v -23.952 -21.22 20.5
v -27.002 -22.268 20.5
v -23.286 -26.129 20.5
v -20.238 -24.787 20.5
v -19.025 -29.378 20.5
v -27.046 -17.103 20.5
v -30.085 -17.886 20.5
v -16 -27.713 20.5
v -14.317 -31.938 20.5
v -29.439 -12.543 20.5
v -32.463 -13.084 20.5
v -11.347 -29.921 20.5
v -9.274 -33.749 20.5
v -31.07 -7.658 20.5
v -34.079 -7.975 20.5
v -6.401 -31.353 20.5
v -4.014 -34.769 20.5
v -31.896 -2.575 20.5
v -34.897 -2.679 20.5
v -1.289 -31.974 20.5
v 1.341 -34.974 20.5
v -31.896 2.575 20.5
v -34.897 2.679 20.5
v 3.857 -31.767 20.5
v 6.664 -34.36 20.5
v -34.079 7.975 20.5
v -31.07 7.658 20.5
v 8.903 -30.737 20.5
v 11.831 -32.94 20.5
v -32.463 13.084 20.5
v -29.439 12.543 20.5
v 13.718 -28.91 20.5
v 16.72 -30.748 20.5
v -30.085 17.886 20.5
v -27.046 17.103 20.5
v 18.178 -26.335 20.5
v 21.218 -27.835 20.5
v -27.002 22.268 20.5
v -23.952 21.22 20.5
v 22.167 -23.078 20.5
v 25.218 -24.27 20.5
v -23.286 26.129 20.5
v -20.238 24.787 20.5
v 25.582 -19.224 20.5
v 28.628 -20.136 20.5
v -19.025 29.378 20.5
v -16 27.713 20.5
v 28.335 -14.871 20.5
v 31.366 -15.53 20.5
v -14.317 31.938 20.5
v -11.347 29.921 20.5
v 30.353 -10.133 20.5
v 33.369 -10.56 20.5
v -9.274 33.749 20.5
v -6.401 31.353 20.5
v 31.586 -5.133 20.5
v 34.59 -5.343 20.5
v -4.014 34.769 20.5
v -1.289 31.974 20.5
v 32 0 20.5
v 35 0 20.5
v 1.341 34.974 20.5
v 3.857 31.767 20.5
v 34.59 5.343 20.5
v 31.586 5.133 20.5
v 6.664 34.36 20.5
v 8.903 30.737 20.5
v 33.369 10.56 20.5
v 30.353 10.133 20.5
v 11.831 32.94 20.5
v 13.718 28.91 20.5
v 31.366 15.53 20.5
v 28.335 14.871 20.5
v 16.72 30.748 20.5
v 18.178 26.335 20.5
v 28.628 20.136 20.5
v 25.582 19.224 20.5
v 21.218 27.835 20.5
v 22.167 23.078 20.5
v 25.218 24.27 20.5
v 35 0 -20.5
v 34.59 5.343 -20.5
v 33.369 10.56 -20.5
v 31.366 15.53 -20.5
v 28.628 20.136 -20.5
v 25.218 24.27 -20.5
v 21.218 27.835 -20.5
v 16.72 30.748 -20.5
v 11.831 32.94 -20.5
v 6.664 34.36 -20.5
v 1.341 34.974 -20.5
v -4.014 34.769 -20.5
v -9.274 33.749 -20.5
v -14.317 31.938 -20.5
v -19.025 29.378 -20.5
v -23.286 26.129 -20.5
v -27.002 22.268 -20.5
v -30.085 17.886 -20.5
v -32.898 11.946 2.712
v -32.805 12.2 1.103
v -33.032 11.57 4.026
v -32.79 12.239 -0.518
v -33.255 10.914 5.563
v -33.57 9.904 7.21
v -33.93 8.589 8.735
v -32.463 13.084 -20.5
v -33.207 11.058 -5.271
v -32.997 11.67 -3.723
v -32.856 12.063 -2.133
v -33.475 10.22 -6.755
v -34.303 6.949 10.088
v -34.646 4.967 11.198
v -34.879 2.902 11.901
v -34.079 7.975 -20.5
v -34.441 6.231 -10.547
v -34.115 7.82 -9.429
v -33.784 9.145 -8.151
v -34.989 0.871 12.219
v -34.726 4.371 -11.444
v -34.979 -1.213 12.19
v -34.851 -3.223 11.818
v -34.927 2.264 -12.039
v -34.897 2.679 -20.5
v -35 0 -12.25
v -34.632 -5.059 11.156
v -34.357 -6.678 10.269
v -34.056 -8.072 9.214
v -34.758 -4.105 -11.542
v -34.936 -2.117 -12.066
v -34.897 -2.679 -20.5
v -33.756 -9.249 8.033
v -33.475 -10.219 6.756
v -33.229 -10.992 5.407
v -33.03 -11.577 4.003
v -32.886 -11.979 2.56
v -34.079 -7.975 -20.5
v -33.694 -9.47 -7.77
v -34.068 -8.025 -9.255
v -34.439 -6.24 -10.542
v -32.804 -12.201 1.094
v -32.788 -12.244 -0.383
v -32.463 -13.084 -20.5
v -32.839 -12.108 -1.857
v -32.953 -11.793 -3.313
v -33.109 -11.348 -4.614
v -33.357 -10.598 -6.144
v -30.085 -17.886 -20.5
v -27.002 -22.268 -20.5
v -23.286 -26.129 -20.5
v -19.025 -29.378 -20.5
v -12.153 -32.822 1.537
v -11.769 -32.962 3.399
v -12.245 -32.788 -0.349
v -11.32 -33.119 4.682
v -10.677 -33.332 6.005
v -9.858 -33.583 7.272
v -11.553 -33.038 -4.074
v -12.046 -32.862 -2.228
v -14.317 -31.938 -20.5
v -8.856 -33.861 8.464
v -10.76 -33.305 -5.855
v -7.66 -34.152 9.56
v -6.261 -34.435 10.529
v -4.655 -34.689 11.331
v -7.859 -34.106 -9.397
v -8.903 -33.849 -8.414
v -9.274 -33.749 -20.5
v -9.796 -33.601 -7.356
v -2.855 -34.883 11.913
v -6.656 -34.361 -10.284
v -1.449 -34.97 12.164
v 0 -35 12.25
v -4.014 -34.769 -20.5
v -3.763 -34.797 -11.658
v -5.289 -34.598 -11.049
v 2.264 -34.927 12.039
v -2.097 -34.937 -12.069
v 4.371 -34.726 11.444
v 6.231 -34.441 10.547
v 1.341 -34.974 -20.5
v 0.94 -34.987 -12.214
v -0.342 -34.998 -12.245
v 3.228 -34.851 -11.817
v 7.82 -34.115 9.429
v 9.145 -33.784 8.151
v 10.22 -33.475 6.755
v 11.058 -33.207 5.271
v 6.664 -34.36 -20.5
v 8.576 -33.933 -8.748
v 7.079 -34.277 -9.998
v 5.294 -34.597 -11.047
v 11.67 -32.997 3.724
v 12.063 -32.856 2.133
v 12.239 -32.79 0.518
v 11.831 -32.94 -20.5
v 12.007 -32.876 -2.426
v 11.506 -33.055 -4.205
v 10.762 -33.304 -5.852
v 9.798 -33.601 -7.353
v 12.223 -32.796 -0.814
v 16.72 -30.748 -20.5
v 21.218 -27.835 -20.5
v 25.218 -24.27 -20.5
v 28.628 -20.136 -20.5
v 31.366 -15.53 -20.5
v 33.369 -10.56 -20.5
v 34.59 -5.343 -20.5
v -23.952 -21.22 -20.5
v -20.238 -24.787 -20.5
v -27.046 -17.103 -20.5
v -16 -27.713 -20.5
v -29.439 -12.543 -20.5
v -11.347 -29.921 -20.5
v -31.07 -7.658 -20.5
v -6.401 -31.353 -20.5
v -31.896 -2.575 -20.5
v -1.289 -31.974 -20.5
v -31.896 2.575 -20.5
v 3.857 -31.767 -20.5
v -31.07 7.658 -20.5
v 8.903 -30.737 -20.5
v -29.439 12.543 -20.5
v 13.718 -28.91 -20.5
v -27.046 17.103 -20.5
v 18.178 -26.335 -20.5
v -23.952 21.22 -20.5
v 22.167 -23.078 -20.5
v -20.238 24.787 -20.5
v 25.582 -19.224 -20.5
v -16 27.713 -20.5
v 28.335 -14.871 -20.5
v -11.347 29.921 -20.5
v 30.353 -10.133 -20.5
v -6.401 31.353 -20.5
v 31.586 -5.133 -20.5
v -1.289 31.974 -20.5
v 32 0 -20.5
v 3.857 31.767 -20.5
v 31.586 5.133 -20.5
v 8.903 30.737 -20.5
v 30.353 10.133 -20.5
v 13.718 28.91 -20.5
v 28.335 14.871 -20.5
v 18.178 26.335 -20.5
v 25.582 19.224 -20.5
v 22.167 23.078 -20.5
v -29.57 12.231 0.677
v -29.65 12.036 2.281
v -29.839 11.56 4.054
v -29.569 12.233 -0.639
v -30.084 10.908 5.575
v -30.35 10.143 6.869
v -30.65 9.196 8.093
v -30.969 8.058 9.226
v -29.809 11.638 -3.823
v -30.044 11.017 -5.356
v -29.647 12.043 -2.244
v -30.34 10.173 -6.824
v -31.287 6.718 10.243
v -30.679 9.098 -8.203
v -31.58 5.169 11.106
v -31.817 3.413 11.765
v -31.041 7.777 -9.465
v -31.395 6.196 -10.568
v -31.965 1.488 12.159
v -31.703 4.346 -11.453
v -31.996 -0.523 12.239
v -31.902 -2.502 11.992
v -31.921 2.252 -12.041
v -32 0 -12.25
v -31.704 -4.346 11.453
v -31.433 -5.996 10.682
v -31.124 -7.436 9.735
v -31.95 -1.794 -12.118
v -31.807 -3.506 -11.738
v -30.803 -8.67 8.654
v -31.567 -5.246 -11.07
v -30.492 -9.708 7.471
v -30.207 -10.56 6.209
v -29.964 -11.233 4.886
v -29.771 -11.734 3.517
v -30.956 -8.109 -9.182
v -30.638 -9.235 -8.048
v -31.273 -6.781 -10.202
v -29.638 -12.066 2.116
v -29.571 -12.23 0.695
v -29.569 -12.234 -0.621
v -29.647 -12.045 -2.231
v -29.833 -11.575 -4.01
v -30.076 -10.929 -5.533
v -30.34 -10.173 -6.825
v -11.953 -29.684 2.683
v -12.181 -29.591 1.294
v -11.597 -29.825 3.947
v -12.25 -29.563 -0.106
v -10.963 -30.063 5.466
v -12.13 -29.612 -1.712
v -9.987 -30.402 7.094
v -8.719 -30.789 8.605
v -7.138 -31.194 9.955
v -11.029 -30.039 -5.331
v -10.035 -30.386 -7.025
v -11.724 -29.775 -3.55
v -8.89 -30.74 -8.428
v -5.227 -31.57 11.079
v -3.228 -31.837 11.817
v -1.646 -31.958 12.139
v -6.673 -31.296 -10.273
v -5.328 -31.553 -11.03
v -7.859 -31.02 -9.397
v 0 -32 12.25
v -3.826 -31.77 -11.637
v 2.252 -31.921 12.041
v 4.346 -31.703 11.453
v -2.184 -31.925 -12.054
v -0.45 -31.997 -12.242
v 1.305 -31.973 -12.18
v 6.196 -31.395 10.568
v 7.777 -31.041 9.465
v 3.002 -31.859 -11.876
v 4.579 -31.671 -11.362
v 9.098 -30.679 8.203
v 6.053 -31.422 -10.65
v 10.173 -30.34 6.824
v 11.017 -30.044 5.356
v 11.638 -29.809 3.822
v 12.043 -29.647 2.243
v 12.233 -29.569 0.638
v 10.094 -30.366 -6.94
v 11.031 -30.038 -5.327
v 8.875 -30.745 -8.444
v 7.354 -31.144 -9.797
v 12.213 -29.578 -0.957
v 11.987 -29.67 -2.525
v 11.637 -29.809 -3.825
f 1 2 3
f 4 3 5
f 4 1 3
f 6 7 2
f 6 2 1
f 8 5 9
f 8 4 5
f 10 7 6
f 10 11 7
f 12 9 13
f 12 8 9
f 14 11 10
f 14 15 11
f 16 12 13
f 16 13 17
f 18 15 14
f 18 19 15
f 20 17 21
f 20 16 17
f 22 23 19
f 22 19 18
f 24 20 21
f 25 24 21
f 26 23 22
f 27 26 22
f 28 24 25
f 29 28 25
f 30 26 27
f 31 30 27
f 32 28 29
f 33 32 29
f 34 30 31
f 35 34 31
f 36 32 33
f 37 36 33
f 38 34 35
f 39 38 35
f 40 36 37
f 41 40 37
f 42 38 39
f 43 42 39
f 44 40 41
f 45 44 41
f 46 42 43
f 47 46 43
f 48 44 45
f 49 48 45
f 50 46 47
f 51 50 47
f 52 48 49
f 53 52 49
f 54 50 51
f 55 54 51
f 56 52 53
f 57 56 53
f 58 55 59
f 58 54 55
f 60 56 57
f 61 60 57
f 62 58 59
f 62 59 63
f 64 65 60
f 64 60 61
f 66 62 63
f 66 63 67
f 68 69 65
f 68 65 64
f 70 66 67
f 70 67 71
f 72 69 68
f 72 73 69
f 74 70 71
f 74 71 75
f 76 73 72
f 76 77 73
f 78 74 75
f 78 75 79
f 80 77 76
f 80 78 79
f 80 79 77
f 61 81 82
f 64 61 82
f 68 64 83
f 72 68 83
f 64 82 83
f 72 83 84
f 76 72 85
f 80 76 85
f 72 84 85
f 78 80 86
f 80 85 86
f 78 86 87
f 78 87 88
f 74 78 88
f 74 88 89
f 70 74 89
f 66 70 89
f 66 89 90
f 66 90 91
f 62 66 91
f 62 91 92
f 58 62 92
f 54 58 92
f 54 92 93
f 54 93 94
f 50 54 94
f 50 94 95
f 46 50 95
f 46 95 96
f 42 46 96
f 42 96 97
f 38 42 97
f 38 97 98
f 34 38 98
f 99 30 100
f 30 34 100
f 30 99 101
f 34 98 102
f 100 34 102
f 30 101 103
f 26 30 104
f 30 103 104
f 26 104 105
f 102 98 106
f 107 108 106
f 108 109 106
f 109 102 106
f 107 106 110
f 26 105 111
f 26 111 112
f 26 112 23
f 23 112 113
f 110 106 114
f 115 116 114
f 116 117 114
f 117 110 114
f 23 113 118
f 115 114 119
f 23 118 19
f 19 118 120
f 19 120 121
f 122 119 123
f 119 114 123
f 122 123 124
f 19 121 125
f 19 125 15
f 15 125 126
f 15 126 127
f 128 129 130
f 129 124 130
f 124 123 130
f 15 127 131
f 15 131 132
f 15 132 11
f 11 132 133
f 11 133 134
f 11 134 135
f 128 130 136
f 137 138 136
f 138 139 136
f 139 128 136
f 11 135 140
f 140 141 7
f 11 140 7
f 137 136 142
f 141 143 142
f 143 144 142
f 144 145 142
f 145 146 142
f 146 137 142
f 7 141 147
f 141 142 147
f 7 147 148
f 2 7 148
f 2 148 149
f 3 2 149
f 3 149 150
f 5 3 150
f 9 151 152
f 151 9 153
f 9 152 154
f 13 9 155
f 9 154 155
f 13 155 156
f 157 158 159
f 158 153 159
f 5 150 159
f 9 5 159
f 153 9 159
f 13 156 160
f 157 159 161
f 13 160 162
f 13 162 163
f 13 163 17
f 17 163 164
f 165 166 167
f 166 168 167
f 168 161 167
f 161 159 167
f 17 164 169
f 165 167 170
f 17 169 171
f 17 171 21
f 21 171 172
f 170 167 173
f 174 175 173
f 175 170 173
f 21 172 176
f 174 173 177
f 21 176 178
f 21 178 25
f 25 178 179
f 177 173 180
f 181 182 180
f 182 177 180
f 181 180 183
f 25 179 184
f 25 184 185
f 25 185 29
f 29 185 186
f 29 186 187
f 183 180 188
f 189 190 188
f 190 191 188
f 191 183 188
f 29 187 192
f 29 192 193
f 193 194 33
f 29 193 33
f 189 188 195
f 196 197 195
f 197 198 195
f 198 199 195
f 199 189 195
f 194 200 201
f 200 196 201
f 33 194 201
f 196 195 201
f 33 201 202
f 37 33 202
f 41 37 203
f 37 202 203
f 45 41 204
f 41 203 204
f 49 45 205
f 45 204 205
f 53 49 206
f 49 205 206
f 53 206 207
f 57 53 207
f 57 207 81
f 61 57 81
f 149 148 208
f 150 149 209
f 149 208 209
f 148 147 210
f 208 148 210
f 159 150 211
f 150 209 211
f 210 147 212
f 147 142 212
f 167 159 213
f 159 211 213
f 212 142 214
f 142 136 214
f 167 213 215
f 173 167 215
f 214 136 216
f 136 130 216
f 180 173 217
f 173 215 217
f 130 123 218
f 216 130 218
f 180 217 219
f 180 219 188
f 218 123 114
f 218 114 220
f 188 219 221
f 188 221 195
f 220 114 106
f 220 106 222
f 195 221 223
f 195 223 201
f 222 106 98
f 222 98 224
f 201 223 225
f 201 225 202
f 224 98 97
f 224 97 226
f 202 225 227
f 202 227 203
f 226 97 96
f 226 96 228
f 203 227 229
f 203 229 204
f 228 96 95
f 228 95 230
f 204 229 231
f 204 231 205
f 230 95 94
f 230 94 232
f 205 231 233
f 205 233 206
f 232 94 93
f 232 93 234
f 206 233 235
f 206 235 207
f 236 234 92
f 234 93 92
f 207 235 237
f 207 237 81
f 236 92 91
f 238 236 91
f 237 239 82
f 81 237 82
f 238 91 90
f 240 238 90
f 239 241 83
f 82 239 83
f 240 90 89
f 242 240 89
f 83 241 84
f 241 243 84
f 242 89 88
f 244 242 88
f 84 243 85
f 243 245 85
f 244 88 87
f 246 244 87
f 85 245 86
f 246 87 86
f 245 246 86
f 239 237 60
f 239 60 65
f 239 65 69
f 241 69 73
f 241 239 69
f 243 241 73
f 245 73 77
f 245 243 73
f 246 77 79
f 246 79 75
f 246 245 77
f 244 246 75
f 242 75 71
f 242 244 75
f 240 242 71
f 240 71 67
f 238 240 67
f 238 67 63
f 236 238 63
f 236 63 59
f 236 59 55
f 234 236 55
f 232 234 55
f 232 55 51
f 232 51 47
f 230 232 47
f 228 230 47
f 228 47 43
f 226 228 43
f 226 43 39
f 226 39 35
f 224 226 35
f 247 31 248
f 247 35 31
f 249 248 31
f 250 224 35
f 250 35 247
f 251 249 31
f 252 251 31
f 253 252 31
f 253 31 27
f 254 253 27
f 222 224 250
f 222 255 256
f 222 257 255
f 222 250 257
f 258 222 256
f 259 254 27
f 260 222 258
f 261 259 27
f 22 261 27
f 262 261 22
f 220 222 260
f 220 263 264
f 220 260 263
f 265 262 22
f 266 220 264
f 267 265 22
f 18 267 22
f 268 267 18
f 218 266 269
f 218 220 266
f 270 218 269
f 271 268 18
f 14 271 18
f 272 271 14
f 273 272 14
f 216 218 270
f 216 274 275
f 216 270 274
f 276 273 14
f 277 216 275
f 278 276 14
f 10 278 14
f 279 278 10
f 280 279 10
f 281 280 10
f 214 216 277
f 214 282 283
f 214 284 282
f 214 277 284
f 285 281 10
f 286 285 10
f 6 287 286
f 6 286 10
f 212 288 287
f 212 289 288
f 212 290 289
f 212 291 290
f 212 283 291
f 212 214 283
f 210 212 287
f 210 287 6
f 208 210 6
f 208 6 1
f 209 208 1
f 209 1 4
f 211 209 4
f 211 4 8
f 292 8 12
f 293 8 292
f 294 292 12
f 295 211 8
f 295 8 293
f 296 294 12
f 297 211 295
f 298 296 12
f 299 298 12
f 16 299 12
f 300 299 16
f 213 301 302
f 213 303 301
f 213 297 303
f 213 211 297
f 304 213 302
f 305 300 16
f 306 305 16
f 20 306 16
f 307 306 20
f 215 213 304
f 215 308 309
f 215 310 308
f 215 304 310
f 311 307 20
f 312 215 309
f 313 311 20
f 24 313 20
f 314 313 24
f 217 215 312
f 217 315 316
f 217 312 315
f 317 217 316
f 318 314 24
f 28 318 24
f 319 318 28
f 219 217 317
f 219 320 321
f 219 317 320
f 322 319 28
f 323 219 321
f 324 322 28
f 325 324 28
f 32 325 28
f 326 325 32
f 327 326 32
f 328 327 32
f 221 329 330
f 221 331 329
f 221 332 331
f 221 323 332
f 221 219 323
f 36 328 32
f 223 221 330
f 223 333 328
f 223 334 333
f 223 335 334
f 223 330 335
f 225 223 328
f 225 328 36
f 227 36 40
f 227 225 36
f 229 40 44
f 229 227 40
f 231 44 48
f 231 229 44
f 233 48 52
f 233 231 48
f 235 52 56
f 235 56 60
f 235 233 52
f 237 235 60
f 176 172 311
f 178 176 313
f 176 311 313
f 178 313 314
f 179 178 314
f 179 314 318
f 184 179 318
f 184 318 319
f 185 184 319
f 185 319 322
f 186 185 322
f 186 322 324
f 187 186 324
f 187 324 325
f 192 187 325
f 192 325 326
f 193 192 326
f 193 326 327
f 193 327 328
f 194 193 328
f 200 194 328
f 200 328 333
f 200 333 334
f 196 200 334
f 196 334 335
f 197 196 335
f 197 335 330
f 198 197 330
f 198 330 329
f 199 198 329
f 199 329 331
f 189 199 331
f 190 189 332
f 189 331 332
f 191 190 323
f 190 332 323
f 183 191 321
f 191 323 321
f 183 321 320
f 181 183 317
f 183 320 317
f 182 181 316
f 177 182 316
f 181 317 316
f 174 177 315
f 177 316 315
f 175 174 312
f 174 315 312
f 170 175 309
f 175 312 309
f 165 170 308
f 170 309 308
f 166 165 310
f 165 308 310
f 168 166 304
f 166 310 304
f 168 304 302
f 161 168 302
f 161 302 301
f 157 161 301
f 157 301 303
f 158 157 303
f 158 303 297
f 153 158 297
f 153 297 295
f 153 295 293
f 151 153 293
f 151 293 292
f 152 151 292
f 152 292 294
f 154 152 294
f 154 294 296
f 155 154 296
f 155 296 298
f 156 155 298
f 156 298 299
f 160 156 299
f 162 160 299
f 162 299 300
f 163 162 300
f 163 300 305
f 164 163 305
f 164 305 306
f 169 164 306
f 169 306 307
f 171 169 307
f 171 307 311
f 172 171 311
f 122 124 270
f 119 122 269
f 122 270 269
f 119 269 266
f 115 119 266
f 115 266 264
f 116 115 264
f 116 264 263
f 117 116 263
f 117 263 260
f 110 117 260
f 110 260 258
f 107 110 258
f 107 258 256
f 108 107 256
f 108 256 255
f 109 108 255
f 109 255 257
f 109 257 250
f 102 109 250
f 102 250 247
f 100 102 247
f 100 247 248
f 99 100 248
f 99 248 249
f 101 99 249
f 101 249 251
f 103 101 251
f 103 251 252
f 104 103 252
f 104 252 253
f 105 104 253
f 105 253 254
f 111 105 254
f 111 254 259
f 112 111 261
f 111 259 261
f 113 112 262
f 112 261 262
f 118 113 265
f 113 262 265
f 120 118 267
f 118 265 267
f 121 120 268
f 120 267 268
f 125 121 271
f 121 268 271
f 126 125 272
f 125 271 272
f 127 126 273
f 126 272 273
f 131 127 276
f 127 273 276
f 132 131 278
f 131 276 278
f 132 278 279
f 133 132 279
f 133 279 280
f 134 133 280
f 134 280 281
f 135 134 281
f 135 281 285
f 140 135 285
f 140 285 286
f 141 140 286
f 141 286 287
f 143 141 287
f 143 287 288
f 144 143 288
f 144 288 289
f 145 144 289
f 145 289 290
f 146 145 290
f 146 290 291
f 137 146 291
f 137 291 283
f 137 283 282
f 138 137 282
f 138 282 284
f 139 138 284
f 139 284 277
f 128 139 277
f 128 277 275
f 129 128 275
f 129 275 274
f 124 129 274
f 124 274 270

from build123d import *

# Parameters (mm, degrees)
BOSS_EXTRUDE1_DEPTH      = 20.5
BOSS_EXTRUDE1_DEPTH_BACK = 20.5
SKETCH1_R                = 35
SKETCH1_R_2              = 32
SKETCH5_R                = 12.25
CUT_EXTRUDE2_DEPTH       = 54.574714185
SKETCH6_R                = 12.25
CUT_EXTRUDE3_DEPTH       = 54.574714354


with BuildPart() as part:
    # Sketch1 → Boss-Extrude1 (new, two sides: drawn at the far end of the back side and taken through both)
    with BuildSketch(Plane.XY.offset(-BOSS_EXTRUDE1_DEPTH_BACK)):
        Circle(SKETCH1_R)
        Circle(SKETCH1_R_2, mode=Mode.SUBTRACT)
    extrude(amount=BOSS_EXTRUDE1_DEPTH + BOSS_EXTRUDE1_DEPTH_BACK)

    # Sketch5 → Cut-Extrude2 (cut, through all)
    with BuildSketch(Plane(origin=(0, 0, 0), x_dir=(0, 0, -1), z_dir=(1, 0, 0))):
        Circle(SKETCH5_R)
    extrude(amount=-CUT_EXTRUDE2_DEPTH, mode=Mode.SUBTRACT)

    # Sketch6 → Cut-Extrude3 (cut, through all)
    with BuildSketch(Plane(origin=(0, 0, 0), x_dir=(1, 0, 0), z_dir=(0, 1, 0))):
        Circle(SKETCH6_R)
    extrude(amount=-CUT_EXTRUDE3_DEPTH, mode=Mode.SUBTRACT)


solid = part.part
